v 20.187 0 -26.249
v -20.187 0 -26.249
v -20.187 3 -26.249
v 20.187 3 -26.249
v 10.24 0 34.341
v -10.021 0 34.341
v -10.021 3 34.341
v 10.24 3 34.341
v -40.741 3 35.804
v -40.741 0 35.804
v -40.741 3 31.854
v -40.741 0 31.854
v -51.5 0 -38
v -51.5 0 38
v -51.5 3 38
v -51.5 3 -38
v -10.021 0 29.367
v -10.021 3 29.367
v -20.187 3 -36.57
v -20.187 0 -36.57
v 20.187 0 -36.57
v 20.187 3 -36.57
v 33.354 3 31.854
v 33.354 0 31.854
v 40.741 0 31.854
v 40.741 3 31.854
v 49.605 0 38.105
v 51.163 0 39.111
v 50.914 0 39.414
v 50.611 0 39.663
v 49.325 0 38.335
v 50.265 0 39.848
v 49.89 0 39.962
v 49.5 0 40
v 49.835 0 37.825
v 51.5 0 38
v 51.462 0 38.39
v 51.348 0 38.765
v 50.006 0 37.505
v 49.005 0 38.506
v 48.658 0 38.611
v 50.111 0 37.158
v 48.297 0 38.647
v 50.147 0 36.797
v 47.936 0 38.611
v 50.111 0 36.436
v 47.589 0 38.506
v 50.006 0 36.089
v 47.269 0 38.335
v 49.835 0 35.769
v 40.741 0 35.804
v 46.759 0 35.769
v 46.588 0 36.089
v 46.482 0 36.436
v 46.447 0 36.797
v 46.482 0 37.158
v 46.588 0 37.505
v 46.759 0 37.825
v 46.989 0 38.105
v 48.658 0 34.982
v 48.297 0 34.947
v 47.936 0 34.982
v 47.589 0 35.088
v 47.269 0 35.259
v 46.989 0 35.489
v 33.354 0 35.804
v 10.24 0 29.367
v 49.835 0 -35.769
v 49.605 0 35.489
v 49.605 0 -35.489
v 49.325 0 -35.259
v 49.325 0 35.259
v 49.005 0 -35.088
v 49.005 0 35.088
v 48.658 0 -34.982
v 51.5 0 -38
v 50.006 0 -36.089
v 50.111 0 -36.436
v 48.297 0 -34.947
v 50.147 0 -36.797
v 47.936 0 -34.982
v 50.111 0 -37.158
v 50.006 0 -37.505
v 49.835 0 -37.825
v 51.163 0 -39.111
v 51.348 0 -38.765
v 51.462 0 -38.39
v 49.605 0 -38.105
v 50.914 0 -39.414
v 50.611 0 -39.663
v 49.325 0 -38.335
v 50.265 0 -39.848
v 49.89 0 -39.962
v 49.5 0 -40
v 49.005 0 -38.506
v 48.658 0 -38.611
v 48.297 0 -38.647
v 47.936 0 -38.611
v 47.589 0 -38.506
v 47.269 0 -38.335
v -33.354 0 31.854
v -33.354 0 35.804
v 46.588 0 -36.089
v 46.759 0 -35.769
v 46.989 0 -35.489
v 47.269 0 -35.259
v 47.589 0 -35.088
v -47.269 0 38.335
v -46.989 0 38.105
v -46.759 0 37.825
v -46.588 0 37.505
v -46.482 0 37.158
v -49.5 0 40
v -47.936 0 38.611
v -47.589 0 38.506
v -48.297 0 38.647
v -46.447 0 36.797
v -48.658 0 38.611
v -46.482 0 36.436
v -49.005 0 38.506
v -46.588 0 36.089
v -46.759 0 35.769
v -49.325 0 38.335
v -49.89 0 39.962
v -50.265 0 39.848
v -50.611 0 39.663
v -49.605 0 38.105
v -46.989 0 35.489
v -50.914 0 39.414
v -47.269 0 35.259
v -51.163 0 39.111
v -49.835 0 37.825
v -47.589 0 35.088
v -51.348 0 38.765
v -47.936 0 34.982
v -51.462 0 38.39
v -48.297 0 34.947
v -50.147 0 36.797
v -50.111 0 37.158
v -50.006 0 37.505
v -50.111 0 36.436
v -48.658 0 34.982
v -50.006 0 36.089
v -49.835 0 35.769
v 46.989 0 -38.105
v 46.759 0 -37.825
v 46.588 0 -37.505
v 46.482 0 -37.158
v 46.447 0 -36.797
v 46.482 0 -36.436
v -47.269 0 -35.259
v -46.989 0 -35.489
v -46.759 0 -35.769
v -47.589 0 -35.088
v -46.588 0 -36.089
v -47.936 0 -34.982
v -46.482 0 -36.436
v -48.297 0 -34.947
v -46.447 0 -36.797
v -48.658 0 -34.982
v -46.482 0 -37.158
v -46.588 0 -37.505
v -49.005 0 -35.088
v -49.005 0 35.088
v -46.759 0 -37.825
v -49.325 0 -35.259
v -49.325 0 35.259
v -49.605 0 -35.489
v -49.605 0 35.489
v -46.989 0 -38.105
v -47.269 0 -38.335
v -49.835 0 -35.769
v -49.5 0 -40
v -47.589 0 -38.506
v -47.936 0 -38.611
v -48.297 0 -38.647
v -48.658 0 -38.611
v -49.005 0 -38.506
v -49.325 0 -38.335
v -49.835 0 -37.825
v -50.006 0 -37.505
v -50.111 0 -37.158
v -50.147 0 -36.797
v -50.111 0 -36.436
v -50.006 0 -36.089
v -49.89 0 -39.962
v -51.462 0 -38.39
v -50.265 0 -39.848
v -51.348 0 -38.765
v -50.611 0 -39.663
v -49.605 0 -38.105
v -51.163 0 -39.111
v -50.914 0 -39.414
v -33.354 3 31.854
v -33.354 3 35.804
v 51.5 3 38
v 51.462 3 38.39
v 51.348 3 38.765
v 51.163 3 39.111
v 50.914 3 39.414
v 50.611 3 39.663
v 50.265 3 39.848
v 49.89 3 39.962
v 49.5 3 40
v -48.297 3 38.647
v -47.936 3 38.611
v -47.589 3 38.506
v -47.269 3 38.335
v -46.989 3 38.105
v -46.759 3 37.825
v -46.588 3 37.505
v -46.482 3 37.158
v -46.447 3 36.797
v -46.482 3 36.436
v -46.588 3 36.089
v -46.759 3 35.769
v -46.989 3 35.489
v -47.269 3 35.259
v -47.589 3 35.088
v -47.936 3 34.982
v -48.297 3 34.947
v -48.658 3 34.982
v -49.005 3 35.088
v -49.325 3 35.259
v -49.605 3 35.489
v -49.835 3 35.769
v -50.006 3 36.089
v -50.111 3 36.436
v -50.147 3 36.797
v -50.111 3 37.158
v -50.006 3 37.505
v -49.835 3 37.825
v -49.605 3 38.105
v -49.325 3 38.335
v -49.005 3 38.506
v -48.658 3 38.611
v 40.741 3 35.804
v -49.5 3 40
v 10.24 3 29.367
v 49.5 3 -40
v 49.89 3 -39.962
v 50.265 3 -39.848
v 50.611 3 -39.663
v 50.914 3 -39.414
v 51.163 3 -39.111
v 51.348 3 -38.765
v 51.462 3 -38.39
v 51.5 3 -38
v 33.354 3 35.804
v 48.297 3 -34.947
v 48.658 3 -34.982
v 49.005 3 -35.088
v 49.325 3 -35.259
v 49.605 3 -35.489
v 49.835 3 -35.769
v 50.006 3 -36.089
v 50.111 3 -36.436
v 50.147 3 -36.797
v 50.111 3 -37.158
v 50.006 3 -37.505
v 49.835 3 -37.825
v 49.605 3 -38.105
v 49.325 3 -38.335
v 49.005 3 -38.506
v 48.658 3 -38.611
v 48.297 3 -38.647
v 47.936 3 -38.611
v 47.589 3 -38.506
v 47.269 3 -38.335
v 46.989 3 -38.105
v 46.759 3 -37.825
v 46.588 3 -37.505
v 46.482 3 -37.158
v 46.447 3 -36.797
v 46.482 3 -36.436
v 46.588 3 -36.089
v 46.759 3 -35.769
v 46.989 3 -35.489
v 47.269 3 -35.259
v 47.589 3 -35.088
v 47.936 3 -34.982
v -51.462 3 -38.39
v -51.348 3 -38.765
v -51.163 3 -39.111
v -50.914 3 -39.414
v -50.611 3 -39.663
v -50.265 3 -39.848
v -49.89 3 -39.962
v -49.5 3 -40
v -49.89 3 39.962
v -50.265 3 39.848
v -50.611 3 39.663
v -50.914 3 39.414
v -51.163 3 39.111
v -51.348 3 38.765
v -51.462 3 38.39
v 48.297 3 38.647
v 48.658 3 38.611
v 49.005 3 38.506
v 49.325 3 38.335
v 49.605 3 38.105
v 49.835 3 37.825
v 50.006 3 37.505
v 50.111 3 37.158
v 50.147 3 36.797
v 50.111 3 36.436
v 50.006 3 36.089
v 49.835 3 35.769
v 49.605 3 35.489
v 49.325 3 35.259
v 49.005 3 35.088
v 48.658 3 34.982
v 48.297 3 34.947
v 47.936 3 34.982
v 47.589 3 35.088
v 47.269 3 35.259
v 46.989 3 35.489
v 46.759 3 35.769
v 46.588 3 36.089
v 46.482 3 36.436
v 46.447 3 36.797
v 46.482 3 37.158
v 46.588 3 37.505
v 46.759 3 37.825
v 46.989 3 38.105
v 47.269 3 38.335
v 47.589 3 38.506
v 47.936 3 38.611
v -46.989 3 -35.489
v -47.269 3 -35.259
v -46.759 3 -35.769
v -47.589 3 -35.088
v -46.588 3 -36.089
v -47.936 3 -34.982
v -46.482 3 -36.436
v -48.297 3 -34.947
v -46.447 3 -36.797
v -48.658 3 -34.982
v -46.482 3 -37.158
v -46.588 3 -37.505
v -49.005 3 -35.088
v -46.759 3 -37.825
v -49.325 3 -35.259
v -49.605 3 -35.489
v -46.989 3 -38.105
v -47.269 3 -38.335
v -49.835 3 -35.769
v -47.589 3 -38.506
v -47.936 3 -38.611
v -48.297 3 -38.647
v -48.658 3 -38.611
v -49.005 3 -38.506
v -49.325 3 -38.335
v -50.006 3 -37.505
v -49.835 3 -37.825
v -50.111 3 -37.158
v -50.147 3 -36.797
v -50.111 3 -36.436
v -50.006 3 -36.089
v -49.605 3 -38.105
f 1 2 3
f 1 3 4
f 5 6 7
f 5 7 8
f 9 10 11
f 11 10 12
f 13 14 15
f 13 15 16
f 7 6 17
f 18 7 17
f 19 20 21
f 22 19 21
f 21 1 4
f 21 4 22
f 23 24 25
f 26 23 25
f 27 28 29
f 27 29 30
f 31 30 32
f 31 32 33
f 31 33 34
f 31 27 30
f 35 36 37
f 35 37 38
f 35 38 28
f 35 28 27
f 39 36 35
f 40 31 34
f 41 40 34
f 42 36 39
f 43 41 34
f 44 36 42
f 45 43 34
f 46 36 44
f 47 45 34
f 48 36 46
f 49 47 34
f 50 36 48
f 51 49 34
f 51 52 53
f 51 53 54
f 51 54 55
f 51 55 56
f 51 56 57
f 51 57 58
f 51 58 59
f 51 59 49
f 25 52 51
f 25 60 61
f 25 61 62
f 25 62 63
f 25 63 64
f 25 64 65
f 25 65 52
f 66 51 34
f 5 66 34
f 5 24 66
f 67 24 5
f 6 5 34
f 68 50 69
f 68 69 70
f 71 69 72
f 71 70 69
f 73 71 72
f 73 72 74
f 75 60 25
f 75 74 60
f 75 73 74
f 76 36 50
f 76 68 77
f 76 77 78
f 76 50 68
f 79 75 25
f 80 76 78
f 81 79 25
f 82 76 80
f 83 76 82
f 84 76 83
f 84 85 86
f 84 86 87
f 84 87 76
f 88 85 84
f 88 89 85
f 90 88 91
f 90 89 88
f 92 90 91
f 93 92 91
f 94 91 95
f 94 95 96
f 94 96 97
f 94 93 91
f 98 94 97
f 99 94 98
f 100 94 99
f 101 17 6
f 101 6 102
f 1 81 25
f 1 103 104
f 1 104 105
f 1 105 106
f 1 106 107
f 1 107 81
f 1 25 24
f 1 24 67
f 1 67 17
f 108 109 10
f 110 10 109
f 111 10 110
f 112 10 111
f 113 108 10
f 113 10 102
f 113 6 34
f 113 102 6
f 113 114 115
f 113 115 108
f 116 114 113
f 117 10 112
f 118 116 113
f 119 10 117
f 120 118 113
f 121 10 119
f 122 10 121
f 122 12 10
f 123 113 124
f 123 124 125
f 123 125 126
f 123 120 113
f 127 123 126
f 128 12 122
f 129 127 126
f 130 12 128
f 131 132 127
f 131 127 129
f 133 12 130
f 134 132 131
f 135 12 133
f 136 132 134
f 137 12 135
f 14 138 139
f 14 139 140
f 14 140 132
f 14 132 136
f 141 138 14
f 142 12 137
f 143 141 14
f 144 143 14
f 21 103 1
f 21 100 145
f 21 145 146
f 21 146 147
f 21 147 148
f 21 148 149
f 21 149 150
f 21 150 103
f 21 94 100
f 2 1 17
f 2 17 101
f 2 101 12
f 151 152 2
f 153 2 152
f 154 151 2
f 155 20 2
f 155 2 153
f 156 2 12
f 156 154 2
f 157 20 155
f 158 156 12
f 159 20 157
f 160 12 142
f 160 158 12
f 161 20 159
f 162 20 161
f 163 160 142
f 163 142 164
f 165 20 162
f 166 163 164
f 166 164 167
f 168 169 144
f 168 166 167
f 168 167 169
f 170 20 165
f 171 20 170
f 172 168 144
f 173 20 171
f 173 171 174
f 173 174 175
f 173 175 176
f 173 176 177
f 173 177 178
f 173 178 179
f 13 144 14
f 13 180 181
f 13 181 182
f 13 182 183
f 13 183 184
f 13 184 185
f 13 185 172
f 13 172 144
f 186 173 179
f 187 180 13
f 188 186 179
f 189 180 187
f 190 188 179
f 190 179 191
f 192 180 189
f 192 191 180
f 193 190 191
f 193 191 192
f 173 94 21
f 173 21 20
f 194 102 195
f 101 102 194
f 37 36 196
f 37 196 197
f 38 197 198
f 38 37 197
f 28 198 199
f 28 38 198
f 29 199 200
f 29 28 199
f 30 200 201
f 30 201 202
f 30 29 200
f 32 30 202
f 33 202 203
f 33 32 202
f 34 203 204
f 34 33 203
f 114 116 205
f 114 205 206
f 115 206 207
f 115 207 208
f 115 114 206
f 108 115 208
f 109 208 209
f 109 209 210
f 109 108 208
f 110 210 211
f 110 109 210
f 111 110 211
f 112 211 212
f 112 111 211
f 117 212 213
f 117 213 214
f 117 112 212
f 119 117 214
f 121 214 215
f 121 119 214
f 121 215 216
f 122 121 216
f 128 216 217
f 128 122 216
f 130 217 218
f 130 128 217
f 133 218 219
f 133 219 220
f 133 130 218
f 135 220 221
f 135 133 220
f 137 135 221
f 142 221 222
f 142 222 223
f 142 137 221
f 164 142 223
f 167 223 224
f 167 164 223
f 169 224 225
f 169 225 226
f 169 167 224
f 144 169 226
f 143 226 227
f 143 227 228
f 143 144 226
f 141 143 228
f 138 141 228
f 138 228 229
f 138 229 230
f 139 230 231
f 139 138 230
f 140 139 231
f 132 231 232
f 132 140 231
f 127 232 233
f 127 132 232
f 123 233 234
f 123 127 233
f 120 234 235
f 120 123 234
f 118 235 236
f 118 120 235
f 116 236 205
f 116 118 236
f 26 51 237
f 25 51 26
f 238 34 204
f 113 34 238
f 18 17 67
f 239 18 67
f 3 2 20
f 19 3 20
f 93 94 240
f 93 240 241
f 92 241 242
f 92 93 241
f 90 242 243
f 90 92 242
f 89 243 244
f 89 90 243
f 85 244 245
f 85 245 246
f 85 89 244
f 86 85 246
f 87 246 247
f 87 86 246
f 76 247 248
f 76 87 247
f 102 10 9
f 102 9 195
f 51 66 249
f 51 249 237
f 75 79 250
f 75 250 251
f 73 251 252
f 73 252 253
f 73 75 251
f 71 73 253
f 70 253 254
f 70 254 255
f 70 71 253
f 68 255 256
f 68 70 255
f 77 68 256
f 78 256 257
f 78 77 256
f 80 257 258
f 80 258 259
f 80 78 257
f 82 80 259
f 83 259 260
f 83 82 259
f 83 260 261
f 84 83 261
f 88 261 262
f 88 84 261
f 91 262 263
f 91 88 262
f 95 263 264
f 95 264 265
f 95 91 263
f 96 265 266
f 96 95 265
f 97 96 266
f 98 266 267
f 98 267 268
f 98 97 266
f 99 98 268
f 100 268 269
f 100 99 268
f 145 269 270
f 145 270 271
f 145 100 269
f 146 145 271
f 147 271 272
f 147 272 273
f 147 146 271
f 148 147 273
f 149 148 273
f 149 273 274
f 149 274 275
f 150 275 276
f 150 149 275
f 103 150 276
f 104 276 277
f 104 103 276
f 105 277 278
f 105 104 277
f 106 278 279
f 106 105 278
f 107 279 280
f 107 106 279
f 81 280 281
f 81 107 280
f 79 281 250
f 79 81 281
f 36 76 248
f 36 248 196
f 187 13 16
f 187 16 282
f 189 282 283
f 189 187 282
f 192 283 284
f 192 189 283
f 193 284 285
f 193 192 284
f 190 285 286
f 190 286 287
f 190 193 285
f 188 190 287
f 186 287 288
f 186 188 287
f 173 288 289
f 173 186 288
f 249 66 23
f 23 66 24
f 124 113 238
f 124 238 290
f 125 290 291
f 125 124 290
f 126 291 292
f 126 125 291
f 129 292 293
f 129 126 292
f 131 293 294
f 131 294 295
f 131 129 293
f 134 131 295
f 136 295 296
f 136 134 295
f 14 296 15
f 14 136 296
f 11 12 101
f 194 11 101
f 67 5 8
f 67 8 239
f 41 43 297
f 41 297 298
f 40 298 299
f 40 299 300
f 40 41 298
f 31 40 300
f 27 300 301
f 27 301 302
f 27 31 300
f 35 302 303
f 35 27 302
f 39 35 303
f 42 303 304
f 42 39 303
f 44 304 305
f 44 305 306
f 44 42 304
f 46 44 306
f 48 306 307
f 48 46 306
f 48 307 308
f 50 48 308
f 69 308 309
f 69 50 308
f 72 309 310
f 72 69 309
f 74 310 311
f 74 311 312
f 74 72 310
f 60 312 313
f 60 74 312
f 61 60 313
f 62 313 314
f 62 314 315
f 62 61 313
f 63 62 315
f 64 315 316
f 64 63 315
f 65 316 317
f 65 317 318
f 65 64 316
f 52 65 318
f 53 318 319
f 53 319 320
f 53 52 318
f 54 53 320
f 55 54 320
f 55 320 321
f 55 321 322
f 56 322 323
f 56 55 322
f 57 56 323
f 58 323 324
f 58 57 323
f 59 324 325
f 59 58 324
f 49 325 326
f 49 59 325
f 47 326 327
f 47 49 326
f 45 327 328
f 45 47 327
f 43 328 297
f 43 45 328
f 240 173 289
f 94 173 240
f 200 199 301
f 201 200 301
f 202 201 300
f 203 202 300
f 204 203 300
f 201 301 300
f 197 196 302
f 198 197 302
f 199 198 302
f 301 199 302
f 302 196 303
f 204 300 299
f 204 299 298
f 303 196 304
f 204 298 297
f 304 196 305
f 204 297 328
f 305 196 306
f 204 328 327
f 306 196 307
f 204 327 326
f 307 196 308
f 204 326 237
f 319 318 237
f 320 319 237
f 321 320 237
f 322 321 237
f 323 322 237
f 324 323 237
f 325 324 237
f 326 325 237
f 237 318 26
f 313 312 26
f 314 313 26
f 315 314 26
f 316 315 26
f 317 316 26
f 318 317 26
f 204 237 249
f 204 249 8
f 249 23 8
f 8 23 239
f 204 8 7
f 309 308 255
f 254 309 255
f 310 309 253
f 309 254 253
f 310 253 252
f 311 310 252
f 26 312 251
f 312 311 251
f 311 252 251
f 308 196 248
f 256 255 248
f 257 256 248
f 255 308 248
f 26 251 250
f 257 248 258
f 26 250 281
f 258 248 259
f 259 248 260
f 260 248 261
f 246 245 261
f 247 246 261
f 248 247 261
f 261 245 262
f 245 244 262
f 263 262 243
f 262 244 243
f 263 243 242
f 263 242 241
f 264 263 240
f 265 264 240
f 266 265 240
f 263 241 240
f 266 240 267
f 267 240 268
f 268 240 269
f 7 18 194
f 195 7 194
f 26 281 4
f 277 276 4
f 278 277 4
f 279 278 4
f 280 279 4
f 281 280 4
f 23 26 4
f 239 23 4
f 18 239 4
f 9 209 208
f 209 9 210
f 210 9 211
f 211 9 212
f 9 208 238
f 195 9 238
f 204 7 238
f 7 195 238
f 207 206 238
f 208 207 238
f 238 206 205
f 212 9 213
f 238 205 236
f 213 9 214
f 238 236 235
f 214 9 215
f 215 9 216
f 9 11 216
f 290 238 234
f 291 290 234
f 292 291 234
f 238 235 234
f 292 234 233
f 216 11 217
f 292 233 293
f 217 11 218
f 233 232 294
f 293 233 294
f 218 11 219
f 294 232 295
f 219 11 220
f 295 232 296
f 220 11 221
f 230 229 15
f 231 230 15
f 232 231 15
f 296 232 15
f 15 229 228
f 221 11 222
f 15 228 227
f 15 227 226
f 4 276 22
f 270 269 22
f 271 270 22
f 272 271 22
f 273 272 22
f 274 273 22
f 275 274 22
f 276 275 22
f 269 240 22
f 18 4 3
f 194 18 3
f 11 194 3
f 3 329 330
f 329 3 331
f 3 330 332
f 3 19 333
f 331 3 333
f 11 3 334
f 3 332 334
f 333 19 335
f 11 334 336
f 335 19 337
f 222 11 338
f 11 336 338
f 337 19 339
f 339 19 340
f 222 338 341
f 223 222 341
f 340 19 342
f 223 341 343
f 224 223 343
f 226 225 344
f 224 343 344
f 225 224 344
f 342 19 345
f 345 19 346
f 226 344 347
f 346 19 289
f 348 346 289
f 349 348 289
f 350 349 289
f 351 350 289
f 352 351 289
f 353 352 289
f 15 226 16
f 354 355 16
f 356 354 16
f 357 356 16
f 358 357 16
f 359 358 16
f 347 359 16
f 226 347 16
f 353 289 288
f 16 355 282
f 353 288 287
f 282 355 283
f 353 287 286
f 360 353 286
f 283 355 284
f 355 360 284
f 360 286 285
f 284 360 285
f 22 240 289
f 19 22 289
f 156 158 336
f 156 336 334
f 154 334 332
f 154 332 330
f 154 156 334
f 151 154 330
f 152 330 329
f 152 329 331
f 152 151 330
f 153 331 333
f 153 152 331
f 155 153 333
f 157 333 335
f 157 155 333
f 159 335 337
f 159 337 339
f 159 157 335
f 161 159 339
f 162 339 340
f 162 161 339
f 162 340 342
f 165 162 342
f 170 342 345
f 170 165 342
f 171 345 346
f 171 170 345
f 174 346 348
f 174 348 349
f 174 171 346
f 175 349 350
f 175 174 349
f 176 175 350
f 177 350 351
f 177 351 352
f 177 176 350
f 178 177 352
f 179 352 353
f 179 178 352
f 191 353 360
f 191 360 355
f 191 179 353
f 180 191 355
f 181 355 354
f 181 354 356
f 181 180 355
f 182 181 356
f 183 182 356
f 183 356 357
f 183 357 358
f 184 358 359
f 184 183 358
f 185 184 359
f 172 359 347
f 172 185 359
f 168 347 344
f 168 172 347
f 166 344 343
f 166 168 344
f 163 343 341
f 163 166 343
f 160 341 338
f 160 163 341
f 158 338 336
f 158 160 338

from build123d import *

# Parameters (mm, degrees)
SKETCH_1_R      = 1.85
SKETCH_1_W      = 40.374860346
SKETCH_1_H      = 10.321291022
SKETCH_1_W_2    = 7.387531562
SKETCH_1_H_2    = 3.94976935
SKETCH_1_W_3    = 20.26085389
SKETCH_1_H_3    = 4.973783626
EXTRUDE_1_DEPTH = 3


with BuildPart() as part:
    # 草图1 → 凸台-拉伸1 (new body)
    with BuildSketch(Plane(origin=(0, 0, 0), x_dir=(1, 0, 0), z_dir=(0, 1, 0))):
        with BuildLine():
            Line((49.5, -40), (-49.5, -40))
            ThreePointArc((-49.5, -40), (-50.914213562, -39.414213562), (-51.5, -38))
            Line((-51.5, -38), (-51.5, 38))
            ThreePointArc((-51.5, 38), (-50.914213562, 39.414213562), (-49.5, 40))
            Line((-49.5, 40), (49.5, 40))
            ThreePointArc((49.5, 40), (50.914213562, 39.414213562), (51.5, 38))
            Line((51.5, 38), (51.5, -38))
            ThreePointArc((51.5, -38), (50.914213562, -39.414213562), (49.5, -40))
        make_face()
        with Locations(Location((-48.296806281, 36.796806281, 0), (0, 0, 270))):
            Circle(SKETCH_1_R, mode=Mode.SUBTRACT)
        with Locations(Location((48.296806281, 36.796806281, 0), (0, 0, 270))):
            Circle(SKETCH_1_R, mode=Mode.SUBTRACT)
        with Locations(Location((48.296806281, -36.796806281, 0), (0, 0, 270))):
            Circle(SKETCH_1_R, mode=Mode.SUBTRACT)
        with Locations(Location((-48.296806281, -36.796806281, 0), (0, 0, 270))):
            Circle(SKETCH_1_R, mode=Mode.SUBTRACT)
        with Locations((0, 31.409786363)):
            Rectangle(SKETCH_1_W, SKETCH_1_H, mode=Mode.SUBTRACT)
        with Locations((37.047373629, -33.829043047)):
            Rectangle(SKETCH_1_W_2, SKETCH_1_H_2, mode=Mode.SUBTRACT)
        with Locations((0.109715815, -31.854158372)):
            Rectangle(SKETCH_1_W_3, SKETCH_1_H_3, mode=Mode.SUBTRACT)
        with Locations((-37.047373629, -33.829043047)):
            Rectangle(SKETCH_1_W_2, SKETCH_1_H_2, mode=Mode.SUBTRACT)
    extrude(amount=EXTRUDE_1_DEPTH)


solid = part.part
